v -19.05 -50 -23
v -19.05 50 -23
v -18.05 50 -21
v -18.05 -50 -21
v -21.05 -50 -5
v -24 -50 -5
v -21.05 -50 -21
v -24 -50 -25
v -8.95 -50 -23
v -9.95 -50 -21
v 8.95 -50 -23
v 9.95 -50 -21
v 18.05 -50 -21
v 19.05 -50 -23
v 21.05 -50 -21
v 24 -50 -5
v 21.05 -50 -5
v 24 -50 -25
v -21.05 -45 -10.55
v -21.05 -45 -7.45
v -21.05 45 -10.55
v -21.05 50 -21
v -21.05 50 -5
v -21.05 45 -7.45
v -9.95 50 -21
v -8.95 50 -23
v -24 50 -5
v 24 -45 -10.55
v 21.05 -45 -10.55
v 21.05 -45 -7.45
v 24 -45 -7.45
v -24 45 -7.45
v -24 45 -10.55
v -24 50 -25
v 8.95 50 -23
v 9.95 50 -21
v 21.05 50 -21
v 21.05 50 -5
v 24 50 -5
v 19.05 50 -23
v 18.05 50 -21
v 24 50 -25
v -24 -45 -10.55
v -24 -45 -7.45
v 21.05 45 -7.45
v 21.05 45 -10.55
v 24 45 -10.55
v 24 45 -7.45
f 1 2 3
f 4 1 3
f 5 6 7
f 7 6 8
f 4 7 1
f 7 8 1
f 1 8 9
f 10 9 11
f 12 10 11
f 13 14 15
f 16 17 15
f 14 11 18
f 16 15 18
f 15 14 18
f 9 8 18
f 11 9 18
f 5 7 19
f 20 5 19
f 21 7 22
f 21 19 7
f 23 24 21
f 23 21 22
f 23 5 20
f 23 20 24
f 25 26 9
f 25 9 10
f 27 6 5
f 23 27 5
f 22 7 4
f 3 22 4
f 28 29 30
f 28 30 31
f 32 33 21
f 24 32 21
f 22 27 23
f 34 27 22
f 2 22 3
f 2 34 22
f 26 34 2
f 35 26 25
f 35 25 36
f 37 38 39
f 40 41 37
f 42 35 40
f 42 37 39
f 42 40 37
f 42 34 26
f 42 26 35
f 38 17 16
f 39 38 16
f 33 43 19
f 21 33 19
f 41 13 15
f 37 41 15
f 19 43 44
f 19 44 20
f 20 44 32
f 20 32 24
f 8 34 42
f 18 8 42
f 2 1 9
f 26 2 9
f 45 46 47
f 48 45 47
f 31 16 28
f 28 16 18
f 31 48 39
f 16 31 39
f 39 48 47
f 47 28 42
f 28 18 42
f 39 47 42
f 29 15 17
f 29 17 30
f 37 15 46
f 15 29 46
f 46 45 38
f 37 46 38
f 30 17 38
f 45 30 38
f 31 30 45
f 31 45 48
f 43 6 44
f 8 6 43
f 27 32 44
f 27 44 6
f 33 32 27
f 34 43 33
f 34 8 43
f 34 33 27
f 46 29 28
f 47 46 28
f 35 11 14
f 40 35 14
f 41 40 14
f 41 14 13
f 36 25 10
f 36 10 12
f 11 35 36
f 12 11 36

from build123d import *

# Parameters (mm, degrees)
BOX_W           = 50
BOX_H           = 90
BOX_DEPTH       = 3.1
SKETCH005_W     = 48
SKETCH005_H     = 100
PAD003_DEPTH    = 20
SKETCH006_W     = 42.1
SKETCH006_H     = 100
POCKET002_DEPTH = 16
SKETCH007_W     = 8.1
SKETCH007_H     = 100
POCKET003_DEPTH = 2
POCKET004_DEPTH = 100.001


with BuildPart() as cube:
    # Box → Box (new body)
    with BuildSketch(Plane(origin=(-25, -45, -10.55), x_dir=(1, 0, 0), z_dir=(0, 0, 1))):
        with Locations((25, 45)):
            Rectangle(BOX_W, BOX_H)
    extrude(amount=BOX_DEPTH)


with BuildPart() as base:
    # Sketch005 → Pad003 (new body)
    with BuildSketch(Plane.XY):
        Rectangle(SKETCH005_W, SKETCH005_H)
    extrude(amount=PAD003_DEPTH)

    # Sketch006 (on Face6 of Pad003) → Pocket002 (cut)
    with BuildSketch(Plane.XY.offset(20)):
        Rectangle(SKETCH006_W, SKETCH006_H)
    extrude(amount=-POCKET002_DEPTH, mode=Mode.SUBTRACT)

    # Sketch007 (on Face6 of Pocket002) → Pocket003 (cut)
    with BuildSketch(Plane.XY.offset(4)):
        with Locations((-14, 0)):
            Rectangle(SKETCH007_W, SKETCH007_H)
        with Locations((14, 0)):
            Rectangle(SKETCH007_W, SKETCH007_H)
    extrude(amount=-POCKET003_DEPTH, mode=Mode.SUBTRACT)

    # Sketch008 (on Face18 of Pocket003) → Pocket004 (cut, through all)
    with BuildSketch(Plane.XZ.offset(50)):
        Polygon((-18.05, 2), (-19.05, 2), (-18.05, 4), align=None)
        Polygon((-9.95, 2), (-8.95, 2), (-9.95, 4), align=None)
        Polygon((9.95, 2), (8.95, 2), (9.95, 4), align=None)
        Polygon((18.05, 2), (19.05, 2), (18.05, 4), align=None)
    extrude(amount=-POCKET004_DEPTH, mode=Mode.SUBTRACT)


with BuildPart() as base_1:
    # Body003 placement: moved
    add(base.part.moved(Location((0, 0, -25))))

    # Cut002: cut Cube
    add(cube.part, mode=Mode.SUBTRACT)


solid = base_1.part
